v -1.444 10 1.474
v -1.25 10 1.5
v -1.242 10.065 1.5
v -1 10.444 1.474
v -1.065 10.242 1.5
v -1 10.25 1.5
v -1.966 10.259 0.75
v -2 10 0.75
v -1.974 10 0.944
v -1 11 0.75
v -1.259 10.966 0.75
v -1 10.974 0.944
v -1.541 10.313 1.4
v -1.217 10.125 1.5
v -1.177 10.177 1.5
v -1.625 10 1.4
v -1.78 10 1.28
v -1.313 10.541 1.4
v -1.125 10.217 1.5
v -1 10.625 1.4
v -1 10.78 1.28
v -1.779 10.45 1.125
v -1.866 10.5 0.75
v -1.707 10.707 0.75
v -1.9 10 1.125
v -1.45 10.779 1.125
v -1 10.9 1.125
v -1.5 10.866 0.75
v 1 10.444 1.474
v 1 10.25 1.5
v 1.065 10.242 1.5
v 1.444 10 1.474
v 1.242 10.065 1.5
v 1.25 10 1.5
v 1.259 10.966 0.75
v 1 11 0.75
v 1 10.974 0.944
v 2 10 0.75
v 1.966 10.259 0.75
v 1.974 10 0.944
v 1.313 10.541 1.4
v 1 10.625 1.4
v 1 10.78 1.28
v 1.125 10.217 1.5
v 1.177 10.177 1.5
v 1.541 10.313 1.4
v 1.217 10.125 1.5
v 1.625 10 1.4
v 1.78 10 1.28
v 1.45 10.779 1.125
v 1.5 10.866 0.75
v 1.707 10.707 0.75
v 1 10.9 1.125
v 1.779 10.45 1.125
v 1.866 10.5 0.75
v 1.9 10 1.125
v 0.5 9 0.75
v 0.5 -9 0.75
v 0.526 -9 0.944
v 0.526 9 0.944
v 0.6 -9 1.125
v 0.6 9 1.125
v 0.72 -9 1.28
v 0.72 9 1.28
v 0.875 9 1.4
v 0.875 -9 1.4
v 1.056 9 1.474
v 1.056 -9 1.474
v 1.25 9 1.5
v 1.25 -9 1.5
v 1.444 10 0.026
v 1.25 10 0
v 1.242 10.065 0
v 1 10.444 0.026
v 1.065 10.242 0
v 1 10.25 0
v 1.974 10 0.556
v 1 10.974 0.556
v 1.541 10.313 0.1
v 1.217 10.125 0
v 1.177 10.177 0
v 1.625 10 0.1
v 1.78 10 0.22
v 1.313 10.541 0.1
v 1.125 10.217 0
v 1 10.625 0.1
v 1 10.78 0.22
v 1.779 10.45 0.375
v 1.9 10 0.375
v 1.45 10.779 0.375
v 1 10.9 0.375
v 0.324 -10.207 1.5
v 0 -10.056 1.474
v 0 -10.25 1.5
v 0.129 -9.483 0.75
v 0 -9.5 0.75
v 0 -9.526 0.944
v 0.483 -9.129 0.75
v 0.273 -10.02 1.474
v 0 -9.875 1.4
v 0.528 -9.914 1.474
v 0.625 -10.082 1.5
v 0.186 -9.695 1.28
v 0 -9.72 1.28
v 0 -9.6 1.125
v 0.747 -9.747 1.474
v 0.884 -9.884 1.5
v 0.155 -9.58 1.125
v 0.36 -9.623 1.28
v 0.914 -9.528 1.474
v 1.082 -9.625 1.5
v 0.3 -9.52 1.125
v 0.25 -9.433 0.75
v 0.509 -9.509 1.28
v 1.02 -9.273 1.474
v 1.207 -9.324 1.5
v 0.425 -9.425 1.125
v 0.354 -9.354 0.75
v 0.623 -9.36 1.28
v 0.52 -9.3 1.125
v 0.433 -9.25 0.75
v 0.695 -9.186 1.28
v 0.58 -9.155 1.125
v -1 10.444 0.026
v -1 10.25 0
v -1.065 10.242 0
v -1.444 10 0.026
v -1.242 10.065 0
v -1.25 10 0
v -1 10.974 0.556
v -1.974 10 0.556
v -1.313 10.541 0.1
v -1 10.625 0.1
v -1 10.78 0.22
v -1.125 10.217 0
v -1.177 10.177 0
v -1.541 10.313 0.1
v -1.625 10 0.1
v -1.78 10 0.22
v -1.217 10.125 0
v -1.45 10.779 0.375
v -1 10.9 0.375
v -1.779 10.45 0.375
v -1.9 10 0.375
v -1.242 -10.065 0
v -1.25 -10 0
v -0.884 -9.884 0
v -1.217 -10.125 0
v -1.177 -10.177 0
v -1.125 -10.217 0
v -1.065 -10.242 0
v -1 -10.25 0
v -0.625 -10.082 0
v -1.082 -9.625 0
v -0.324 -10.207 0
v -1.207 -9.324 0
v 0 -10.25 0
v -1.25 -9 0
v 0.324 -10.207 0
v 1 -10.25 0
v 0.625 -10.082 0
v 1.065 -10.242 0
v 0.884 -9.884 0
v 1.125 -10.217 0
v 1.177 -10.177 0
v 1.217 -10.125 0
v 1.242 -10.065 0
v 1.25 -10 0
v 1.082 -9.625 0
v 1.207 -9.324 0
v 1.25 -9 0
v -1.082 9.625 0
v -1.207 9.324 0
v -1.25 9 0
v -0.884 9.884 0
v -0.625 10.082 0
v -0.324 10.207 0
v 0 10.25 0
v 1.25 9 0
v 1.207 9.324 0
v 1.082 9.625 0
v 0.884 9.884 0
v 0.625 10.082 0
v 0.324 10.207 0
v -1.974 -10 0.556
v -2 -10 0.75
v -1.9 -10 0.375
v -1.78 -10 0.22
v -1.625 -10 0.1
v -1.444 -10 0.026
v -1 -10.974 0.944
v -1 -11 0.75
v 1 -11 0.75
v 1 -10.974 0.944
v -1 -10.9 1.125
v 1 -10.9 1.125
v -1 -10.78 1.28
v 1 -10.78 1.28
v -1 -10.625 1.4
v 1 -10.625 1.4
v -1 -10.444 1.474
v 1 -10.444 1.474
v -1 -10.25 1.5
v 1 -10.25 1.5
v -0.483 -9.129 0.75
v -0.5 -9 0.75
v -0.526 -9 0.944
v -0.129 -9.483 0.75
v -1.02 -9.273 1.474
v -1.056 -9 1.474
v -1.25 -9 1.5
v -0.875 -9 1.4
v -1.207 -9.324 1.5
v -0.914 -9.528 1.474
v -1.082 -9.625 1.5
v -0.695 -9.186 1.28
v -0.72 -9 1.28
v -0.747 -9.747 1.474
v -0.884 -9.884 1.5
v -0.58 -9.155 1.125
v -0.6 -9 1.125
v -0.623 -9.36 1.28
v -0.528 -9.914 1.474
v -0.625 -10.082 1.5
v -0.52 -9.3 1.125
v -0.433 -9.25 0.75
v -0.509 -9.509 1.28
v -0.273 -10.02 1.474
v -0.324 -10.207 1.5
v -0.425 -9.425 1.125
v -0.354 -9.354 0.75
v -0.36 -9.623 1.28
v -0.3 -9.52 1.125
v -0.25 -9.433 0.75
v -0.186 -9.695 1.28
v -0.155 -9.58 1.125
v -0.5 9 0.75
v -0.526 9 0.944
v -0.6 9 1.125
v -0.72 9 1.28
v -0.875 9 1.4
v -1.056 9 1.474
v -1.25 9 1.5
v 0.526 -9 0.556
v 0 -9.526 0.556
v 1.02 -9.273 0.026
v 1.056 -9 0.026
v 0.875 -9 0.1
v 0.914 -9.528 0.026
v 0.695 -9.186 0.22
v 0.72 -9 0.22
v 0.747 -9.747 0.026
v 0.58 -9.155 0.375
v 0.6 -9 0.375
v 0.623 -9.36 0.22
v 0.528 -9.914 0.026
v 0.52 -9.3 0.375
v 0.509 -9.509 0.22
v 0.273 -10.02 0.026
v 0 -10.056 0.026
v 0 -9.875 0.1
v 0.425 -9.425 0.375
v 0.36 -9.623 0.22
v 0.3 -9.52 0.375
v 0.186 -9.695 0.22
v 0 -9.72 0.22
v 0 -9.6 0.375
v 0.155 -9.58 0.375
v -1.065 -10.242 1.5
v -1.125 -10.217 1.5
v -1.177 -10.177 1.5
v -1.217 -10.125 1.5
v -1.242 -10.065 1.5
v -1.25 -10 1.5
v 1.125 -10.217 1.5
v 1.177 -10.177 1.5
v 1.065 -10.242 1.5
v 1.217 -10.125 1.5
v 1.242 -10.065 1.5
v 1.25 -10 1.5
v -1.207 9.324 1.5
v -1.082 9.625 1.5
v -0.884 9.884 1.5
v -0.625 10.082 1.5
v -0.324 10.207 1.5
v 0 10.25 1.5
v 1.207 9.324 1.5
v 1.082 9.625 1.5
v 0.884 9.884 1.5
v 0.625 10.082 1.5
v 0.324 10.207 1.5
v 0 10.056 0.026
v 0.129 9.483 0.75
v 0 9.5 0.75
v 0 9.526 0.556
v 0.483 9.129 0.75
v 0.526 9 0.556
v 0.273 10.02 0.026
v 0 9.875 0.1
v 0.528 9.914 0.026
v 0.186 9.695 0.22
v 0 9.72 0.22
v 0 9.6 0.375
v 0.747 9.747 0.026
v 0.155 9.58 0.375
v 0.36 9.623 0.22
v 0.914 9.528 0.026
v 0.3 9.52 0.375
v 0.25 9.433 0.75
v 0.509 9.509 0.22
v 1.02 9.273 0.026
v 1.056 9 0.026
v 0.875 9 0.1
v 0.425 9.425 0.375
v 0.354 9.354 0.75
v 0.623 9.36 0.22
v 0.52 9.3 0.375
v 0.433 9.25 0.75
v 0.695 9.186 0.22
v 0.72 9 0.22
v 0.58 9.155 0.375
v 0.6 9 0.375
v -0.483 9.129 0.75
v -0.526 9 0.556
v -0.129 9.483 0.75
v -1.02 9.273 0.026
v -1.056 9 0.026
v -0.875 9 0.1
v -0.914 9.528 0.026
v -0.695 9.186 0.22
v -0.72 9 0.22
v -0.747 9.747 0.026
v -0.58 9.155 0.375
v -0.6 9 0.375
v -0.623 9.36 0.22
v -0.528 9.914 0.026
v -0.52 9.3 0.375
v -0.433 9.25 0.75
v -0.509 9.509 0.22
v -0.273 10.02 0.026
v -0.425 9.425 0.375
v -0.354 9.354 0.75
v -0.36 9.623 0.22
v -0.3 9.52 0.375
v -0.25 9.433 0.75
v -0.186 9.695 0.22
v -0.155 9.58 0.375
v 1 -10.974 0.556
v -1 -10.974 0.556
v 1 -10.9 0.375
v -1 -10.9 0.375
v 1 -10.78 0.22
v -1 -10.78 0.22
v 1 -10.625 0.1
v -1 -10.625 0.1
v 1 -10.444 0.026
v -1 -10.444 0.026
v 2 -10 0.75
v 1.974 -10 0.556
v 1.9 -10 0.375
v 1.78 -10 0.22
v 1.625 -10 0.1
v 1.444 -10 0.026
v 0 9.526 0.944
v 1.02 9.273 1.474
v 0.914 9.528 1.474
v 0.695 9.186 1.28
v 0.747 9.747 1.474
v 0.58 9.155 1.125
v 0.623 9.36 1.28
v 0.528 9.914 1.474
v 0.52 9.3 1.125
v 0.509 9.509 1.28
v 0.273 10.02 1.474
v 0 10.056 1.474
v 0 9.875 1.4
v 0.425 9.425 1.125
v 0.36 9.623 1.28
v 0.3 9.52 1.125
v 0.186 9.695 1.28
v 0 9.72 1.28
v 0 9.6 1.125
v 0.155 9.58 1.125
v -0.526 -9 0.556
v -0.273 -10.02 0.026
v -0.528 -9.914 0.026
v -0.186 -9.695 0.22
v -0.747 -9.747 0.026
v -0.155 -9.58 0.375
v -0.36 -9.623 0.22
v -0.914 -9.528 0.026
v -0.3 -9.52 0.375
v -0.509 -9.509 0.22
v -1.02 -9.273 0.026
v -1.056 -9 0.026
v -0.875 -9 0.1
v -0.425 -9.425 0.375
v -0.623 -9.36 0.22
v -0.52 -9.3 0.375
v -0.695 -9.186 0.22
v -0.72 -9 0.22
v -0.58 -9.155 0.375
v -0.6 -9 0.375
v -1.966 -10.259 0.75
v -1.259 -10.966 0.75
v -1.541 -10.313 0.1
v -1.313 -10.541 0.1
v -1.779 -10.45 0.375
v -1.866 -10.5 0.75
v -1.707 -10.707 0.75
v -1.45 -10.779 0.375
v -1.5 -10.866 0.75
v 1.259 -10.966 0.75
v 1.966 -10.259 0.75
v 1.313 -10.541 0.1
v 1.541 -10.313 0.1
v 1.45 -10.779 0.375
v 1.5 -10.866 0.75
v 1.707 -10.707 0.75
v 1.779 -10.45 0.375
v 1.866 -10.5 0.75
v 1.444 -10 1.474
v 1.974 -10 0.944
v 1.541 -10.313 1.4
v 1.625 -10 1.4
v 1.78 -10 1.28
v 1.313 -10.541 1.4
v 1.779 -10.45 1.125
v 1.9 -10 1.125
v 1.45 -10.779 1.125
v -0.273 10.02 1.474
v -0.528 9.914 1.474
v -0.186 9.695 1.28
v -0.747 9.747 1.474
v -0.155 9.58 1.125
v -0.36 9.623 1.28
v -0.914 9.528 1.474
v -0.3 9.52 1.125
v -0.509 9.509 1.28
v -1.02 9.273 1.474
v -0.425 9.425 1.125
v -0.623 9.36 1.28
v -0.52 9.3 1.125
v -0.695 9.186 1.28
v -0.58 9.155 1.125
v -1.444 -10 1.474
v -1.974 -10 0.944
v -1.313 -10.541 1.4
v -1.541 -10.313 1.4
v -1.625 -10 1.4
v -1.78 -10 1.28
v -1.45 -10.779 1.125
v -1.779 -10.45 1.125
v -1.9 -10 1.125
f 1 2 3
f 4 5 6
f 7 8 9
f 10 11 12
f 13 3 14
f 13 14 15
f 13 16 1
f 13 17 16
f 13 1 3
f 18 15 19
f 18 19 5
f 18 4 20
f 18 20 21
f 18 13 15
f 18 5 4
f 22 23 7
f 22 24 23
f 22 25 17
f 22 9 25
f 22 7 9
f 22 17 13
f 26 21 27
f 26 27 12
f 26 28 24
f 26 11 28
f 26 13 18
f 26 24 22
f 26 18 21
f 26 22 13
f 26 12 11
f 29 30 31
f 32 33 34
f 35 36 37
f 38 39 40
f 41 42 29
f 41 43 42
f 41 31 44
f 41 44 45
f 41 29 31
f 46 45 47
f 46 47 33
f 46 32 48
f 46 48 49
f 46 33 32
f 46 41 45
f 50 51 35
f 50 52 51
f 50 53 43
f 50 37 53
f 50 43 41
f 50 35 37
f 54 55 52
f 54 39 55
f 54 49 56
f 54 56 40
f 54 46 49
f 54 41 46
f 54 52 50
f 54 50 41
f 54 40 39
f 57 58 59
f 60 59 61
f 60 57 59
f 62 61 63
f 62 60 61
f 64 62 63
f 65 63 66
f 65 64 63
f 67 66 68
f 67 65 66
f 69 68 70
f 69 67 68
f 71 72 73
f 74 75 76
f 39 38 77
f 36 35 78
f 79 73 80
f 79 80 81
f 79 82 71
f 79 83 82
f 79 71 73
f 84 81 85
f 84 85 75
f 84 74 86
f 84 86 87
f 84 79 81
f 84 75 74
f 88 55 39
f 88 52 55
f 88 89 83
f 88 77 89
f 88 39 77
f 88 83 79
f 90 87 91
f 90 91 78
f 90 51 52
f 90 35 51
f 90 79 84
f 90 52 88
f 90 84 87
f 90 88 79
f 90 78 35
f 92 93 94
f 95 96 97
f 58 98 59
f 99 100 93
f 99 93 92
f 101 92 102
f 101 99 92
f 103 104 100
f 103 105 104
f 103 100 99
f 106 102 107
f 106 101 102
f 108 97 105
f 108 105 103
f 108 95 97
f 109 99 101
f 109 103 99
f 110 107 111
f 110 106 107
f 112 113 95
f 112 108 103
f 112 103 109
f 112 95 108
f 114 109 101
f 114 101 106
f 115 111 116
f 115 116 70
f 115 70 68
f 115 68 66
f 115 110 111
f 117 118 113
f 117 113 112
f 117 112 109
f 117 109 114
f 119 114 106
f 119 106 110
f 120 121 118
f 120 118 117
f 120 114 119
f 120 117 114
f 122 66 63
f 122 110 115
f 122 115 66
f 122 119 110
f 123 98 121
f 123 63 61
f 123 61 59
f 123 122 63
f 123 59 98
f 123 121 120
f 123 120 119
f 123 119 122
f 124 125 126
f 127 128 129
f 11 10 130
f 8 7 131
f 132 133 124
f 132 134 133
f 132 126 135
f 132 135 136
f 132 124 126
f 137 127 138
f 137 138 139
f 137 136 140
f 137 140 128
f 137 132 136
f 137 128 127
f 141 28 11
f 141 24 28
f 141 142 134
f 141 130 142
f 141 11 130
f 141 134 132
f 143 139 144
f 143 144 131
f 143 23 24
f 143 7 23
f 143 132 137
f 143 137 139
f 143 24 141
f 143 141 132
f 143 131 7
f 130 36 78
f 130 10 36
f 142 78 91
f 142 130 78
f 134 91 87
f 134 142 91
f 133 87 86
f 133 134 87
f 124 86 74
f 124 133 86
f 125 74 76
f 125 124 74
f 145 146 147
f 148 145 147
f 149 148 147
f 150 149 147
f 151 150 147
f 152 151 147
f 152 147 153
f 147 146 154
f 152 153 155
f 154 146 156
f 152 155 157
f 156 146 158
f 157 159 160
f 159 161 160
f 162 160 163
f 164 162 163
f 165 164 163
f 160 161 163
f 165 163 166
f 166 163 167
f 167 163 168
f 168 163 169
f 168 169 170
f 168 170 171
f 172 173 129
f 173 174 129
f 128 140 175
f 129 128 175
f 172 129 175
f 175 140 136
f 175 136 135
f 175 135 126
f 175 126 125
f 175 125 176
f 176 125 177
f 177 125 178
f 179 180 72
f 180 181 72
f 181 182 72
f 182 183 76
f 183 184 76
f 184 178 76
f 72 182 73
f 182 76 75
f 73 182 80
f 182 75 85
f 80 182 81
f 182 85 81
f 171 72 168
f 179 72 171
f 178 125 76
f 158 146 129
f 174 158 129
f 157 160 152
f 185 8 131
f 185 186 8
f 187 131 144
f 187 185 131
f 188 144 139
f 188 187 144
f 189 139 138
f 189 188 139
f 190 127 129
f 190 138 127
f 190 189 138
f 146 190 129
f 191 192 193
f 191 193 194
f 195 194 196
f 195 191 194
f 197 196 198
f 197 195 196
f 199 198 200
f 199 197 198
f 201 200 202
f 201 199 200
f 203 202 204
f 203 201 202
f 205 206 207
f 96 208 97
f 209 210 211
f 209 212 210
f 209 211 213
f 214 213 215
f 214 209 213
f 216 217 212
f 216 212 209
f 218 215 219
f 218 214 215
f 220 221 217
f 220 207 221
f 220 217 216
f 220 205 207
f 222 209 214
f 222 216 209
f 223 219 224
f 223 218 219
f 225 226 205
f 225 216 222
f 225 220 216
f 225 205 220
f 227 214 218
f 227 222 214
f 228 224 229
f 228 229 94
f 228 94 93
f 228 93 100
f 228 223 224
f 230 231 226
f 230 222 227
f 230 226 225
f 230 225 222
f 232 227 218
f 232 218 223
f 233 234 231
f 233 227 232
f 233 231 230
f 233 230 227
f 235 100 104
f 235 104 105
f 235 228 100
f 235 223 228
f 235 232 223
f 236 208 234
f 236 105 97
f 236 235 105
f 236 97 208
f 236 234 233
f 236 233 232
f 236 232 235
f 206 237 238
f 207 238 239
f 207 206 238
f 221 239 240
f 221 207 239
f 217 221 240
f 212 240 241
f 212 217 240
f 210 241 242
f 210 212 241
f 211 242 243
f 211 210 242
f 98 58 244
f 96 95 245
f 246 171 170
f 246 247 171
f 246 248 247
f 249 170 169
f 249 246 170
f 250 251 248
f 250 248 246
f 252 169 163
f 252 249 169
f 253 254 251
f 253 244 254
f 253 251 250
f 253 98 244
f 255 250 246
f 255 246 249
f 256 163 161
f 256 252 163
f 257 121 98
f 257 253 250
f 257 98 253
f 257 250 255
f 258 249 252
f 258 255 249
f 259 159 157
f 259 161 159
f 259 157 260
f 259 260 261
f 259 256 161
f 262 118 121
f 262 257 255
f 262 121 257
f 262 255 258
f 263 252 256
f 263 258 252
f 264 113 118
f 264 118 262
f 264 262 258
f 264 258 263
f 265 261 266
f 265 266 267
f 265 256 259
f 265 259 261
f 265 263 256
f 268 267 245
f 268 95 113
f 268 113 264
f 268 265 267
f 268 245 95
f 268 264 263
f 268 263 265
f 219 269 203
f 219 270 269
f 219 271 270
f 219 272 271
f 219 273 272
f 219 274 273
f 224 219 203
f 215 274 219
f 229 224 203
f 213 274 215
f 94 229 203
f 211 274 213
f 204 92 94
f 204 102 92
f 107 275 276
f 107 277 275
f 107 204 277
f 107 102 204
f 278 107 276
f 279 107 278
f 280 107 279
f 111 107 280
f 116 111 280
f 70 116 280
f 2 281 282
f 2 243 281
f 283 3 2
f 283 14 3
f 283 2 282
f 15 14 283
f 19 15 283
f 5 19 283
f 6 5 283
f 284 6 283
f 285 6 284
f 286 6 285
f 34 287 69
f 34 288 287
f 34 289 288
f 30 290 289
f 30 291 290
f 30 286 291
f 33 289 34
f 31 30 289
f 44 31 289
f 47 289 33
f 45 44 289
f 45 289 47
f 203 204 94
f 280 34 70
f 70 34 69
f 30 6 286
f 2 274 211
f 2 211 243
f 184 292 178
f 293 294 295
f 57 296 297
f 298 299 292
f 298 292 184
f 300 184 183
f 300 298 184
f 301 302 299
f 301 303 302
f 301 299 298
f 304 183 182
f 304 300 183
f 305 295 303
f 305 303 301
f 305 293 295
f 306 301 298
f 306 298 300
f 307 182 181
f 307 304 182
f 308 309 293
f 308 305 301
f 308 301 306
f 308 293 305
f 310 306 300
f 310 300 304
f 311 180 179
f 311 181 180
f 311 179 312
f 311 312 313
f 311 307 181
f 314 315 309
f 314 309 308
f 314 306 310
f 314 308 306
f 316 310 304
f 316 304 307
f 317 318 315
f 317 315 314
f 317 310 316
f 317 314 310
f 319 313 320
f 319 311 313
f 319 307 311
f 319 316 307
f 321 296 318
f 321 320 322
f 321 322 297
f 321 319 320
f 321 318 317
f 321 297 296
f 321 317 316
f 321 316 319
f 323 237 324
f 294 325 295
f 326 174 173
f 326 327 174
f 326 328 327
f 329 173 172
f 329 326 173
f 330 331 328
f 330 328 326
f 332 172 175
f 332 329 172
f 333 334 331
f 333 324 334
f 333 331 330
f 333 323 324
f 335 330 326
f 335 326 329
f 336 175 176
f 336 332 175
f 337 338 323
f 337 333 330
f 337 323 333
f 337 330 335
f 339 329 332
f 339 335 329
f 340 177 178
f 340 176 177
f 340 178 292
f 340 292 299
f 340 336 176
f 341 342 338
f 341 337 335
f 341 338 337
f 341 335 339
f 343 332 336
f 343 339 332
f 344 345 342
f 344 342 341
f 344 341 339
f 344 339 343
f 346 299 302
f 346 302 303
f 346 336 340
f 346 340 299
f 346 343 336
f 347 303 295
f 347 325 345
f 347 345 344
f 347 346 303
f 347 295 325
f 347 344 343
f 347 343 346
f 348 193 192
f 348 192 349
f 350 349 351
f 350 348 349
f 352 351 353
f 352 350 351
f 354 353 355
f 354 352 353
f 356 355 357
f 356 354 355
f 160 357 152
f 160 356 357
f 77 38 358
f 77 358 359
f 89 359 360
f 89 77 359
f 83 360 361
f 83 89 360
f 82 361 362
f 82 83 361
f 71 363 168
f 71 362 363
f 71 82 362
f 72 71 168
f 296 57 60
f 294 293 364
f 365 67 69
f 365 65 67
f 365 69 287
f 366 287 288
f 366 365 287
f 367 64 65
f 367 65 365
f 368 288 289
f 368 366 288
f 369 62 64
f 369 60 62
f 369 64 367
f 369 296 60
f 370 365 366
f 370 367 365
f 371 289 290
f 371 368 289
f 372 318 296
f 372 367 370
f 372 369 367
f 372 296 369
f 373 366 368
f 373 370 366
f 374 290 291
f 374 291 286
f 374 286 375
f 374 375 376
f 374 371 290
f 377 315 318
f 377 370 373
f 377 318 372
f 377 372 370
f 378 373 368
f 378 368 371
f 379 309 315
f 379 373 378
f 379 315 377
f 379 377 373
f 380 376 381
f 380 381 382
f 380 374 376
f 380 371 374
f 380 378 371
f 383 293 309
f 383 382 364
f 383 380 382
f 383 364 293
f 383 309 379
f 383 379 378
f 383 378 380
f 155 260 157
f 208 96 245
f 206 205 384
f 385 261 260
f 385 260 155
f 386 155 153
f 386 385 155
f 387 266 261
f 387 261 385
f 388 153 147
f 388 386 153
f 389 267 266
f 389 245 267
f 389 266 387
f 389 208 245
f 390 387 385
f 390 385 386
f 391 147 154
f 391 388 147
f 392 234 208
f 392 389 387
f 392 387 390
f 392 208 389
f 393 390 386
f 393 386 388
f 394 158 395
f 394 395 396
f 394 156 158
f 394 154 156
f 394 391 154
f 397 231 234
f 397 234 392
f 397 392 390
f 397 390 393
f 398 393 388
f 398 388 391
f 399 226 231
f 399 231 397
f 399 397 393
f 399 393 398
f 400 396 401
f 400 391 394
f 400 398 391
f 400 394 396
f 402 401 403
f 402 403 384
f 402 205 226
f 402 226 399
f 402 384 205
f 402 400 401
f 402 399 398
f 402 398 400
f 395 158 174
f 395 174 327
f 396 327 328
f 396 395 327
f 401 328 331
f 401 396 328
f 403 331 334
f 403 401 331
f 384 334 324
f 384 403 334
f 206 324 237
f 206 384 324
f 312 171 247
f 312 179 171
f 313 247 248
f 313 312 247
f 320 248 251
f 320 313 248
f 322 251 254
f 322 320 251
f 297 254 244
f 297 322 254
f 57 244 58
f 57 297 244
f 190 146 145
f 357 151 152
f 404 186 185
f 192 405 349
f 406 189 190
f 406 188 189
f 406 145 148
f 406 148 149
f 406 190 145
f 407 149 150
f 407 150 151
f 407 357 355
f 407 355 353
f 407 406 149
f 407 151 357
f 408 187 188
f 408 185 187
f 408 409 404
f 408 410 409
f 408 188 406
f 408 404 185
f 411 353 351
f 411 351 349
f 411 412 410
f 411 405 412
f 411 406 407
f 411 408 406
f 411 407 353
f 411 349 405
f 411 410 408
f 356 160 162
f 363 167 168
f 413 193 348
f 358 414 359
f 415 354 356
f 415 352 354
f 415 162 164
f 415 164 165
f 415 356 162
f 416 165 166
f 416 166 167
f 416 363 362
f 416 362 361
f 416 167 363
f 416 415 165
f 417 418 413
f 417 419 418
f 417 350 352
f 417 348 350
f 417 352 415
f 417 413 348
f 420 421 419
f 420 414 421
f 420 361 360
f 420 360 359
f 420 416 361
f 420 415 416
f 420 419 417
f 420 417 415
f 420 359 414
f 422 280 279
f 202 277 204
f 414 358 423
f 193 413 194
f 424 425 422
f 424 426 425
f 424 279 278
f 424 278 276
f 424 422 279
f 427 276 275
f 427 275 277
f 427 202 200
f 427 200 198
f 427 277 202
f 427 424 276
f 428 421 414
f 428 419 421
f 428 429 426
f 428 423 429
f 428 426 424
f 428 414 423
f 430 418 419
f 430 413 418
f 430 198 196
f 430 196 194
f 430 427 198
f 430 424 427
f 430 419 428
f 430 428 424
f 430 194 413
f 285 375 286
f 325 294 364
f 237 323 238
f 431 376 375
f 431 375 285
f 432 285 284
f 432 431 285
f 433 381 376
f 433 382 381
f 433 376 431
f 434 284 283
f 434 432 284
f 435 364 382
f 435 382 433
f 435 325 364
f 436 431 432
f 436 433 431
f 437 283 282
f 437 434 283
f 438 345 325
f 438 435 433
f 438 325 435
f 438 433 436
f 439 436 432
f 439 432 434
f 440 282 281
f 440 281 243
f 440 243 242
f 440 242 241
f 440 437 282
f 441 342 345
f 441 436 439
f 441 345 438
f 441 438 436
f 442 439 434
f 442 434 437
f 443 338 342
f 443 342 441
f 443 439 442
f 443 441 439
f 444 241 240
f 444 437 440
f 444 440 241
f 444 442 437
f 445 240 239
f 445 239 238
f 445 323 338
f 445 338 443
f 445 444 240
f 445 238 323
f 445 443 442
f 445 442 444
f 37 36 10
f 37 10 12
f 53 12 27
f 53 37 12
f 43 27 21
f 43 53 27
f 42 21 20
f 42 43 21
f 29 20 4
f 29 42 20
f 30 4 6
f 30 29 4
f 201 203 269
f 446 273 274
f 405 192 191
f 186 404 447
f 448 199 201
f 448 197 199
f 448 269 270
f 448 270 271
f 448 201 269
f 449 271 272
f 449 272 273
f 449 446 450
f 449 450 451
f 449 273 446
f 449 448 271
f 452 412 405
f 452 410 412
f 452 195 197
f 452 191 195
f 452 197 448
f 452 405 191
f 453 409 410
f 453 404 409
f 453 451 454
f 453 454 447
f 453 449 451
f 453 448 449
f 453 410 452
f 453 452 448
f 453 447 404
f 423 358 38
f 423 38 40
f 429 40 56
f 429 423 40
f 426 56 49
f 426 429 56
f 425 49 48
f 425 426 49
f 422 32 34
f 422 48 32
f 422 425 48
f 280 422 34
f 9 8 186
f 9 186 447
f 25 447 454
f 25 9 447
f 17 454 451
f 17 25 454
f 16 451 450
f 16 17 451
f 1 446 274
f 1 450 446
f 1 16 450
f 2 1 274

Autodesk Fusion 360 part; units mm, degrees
sketch "Sketch1" plane through (0, 0, 0) normal (0, 0, 1) x (1, 0, 0)
  line L0 (2, 11) -> (-2, 11)
  line L1 (-2, 11) -> (-2, -11)
  line L2 (-2, -11) -> (2, -11)
  line L3 (2, -11) -> (2, 11)
  line L4 (2, 11) -> (-2, -11) construction
  line L5 (-2, 11) -> (2, -11) construction
  line L6 (0.5, -9.5) -> (0.5, 9.5)
  line L7 (0.5, 9.5) -> (-0.5, 9.5)
  line L8 (-0.5, 9.5) -> (-0.5, -9.5)
  line L9 (-0.5, -9.5) -> (0.5, -9.5)
  dimension "d1" = 4
  dimension "d2" = 22
  dimension "d3" = -1.5
extrude "Extrude1" add sketch "Sketch1" along normal blind 1.5
fillet "Fillet1" radius 1 4 edges at (2, 11, 0.75) (-2, -11, 0.75) (2, -11, 0.75) (-2, 11, 0.75)
fillet "Fillet1" radius 0.5 4 edges at (-0.5, 9.5, 0.75) (0.5, 9.5, 0.75) (0.5, -9.5, 0.75) (-0.5, -9.5, 0.75)
fillet "Fillet2" radius 0.75 24 edges at (-1.7071, -10.7071, 1.5) (-2, 0, 1.5) (-1.7071, 10.7071, 1.5) (0, 11, 1.5) (1.7071, 10.7071, 1.5) (2, 0, 1.5) (1.7071, -10.7071, 1.5) (0, -11, 1.5) (0, 9.5, 1.5) (-0.5, 0, 1.5) (0, -9.5, 1.5) (0.5, 0, 1.5) (0, 11, 0) (-1.7071, 10.7071, 0) (-2, 0, 0) (-1.7071, -10.7071, 0) (0, -11, 0) (1.7071, -10.7071, 0) (2, 0, 0) (1.7071, 10.7071, 0) (0, 9.5, 0) (0.5, 0, 0) (0, -9.5, 0) (-0.5, 0, 0)
